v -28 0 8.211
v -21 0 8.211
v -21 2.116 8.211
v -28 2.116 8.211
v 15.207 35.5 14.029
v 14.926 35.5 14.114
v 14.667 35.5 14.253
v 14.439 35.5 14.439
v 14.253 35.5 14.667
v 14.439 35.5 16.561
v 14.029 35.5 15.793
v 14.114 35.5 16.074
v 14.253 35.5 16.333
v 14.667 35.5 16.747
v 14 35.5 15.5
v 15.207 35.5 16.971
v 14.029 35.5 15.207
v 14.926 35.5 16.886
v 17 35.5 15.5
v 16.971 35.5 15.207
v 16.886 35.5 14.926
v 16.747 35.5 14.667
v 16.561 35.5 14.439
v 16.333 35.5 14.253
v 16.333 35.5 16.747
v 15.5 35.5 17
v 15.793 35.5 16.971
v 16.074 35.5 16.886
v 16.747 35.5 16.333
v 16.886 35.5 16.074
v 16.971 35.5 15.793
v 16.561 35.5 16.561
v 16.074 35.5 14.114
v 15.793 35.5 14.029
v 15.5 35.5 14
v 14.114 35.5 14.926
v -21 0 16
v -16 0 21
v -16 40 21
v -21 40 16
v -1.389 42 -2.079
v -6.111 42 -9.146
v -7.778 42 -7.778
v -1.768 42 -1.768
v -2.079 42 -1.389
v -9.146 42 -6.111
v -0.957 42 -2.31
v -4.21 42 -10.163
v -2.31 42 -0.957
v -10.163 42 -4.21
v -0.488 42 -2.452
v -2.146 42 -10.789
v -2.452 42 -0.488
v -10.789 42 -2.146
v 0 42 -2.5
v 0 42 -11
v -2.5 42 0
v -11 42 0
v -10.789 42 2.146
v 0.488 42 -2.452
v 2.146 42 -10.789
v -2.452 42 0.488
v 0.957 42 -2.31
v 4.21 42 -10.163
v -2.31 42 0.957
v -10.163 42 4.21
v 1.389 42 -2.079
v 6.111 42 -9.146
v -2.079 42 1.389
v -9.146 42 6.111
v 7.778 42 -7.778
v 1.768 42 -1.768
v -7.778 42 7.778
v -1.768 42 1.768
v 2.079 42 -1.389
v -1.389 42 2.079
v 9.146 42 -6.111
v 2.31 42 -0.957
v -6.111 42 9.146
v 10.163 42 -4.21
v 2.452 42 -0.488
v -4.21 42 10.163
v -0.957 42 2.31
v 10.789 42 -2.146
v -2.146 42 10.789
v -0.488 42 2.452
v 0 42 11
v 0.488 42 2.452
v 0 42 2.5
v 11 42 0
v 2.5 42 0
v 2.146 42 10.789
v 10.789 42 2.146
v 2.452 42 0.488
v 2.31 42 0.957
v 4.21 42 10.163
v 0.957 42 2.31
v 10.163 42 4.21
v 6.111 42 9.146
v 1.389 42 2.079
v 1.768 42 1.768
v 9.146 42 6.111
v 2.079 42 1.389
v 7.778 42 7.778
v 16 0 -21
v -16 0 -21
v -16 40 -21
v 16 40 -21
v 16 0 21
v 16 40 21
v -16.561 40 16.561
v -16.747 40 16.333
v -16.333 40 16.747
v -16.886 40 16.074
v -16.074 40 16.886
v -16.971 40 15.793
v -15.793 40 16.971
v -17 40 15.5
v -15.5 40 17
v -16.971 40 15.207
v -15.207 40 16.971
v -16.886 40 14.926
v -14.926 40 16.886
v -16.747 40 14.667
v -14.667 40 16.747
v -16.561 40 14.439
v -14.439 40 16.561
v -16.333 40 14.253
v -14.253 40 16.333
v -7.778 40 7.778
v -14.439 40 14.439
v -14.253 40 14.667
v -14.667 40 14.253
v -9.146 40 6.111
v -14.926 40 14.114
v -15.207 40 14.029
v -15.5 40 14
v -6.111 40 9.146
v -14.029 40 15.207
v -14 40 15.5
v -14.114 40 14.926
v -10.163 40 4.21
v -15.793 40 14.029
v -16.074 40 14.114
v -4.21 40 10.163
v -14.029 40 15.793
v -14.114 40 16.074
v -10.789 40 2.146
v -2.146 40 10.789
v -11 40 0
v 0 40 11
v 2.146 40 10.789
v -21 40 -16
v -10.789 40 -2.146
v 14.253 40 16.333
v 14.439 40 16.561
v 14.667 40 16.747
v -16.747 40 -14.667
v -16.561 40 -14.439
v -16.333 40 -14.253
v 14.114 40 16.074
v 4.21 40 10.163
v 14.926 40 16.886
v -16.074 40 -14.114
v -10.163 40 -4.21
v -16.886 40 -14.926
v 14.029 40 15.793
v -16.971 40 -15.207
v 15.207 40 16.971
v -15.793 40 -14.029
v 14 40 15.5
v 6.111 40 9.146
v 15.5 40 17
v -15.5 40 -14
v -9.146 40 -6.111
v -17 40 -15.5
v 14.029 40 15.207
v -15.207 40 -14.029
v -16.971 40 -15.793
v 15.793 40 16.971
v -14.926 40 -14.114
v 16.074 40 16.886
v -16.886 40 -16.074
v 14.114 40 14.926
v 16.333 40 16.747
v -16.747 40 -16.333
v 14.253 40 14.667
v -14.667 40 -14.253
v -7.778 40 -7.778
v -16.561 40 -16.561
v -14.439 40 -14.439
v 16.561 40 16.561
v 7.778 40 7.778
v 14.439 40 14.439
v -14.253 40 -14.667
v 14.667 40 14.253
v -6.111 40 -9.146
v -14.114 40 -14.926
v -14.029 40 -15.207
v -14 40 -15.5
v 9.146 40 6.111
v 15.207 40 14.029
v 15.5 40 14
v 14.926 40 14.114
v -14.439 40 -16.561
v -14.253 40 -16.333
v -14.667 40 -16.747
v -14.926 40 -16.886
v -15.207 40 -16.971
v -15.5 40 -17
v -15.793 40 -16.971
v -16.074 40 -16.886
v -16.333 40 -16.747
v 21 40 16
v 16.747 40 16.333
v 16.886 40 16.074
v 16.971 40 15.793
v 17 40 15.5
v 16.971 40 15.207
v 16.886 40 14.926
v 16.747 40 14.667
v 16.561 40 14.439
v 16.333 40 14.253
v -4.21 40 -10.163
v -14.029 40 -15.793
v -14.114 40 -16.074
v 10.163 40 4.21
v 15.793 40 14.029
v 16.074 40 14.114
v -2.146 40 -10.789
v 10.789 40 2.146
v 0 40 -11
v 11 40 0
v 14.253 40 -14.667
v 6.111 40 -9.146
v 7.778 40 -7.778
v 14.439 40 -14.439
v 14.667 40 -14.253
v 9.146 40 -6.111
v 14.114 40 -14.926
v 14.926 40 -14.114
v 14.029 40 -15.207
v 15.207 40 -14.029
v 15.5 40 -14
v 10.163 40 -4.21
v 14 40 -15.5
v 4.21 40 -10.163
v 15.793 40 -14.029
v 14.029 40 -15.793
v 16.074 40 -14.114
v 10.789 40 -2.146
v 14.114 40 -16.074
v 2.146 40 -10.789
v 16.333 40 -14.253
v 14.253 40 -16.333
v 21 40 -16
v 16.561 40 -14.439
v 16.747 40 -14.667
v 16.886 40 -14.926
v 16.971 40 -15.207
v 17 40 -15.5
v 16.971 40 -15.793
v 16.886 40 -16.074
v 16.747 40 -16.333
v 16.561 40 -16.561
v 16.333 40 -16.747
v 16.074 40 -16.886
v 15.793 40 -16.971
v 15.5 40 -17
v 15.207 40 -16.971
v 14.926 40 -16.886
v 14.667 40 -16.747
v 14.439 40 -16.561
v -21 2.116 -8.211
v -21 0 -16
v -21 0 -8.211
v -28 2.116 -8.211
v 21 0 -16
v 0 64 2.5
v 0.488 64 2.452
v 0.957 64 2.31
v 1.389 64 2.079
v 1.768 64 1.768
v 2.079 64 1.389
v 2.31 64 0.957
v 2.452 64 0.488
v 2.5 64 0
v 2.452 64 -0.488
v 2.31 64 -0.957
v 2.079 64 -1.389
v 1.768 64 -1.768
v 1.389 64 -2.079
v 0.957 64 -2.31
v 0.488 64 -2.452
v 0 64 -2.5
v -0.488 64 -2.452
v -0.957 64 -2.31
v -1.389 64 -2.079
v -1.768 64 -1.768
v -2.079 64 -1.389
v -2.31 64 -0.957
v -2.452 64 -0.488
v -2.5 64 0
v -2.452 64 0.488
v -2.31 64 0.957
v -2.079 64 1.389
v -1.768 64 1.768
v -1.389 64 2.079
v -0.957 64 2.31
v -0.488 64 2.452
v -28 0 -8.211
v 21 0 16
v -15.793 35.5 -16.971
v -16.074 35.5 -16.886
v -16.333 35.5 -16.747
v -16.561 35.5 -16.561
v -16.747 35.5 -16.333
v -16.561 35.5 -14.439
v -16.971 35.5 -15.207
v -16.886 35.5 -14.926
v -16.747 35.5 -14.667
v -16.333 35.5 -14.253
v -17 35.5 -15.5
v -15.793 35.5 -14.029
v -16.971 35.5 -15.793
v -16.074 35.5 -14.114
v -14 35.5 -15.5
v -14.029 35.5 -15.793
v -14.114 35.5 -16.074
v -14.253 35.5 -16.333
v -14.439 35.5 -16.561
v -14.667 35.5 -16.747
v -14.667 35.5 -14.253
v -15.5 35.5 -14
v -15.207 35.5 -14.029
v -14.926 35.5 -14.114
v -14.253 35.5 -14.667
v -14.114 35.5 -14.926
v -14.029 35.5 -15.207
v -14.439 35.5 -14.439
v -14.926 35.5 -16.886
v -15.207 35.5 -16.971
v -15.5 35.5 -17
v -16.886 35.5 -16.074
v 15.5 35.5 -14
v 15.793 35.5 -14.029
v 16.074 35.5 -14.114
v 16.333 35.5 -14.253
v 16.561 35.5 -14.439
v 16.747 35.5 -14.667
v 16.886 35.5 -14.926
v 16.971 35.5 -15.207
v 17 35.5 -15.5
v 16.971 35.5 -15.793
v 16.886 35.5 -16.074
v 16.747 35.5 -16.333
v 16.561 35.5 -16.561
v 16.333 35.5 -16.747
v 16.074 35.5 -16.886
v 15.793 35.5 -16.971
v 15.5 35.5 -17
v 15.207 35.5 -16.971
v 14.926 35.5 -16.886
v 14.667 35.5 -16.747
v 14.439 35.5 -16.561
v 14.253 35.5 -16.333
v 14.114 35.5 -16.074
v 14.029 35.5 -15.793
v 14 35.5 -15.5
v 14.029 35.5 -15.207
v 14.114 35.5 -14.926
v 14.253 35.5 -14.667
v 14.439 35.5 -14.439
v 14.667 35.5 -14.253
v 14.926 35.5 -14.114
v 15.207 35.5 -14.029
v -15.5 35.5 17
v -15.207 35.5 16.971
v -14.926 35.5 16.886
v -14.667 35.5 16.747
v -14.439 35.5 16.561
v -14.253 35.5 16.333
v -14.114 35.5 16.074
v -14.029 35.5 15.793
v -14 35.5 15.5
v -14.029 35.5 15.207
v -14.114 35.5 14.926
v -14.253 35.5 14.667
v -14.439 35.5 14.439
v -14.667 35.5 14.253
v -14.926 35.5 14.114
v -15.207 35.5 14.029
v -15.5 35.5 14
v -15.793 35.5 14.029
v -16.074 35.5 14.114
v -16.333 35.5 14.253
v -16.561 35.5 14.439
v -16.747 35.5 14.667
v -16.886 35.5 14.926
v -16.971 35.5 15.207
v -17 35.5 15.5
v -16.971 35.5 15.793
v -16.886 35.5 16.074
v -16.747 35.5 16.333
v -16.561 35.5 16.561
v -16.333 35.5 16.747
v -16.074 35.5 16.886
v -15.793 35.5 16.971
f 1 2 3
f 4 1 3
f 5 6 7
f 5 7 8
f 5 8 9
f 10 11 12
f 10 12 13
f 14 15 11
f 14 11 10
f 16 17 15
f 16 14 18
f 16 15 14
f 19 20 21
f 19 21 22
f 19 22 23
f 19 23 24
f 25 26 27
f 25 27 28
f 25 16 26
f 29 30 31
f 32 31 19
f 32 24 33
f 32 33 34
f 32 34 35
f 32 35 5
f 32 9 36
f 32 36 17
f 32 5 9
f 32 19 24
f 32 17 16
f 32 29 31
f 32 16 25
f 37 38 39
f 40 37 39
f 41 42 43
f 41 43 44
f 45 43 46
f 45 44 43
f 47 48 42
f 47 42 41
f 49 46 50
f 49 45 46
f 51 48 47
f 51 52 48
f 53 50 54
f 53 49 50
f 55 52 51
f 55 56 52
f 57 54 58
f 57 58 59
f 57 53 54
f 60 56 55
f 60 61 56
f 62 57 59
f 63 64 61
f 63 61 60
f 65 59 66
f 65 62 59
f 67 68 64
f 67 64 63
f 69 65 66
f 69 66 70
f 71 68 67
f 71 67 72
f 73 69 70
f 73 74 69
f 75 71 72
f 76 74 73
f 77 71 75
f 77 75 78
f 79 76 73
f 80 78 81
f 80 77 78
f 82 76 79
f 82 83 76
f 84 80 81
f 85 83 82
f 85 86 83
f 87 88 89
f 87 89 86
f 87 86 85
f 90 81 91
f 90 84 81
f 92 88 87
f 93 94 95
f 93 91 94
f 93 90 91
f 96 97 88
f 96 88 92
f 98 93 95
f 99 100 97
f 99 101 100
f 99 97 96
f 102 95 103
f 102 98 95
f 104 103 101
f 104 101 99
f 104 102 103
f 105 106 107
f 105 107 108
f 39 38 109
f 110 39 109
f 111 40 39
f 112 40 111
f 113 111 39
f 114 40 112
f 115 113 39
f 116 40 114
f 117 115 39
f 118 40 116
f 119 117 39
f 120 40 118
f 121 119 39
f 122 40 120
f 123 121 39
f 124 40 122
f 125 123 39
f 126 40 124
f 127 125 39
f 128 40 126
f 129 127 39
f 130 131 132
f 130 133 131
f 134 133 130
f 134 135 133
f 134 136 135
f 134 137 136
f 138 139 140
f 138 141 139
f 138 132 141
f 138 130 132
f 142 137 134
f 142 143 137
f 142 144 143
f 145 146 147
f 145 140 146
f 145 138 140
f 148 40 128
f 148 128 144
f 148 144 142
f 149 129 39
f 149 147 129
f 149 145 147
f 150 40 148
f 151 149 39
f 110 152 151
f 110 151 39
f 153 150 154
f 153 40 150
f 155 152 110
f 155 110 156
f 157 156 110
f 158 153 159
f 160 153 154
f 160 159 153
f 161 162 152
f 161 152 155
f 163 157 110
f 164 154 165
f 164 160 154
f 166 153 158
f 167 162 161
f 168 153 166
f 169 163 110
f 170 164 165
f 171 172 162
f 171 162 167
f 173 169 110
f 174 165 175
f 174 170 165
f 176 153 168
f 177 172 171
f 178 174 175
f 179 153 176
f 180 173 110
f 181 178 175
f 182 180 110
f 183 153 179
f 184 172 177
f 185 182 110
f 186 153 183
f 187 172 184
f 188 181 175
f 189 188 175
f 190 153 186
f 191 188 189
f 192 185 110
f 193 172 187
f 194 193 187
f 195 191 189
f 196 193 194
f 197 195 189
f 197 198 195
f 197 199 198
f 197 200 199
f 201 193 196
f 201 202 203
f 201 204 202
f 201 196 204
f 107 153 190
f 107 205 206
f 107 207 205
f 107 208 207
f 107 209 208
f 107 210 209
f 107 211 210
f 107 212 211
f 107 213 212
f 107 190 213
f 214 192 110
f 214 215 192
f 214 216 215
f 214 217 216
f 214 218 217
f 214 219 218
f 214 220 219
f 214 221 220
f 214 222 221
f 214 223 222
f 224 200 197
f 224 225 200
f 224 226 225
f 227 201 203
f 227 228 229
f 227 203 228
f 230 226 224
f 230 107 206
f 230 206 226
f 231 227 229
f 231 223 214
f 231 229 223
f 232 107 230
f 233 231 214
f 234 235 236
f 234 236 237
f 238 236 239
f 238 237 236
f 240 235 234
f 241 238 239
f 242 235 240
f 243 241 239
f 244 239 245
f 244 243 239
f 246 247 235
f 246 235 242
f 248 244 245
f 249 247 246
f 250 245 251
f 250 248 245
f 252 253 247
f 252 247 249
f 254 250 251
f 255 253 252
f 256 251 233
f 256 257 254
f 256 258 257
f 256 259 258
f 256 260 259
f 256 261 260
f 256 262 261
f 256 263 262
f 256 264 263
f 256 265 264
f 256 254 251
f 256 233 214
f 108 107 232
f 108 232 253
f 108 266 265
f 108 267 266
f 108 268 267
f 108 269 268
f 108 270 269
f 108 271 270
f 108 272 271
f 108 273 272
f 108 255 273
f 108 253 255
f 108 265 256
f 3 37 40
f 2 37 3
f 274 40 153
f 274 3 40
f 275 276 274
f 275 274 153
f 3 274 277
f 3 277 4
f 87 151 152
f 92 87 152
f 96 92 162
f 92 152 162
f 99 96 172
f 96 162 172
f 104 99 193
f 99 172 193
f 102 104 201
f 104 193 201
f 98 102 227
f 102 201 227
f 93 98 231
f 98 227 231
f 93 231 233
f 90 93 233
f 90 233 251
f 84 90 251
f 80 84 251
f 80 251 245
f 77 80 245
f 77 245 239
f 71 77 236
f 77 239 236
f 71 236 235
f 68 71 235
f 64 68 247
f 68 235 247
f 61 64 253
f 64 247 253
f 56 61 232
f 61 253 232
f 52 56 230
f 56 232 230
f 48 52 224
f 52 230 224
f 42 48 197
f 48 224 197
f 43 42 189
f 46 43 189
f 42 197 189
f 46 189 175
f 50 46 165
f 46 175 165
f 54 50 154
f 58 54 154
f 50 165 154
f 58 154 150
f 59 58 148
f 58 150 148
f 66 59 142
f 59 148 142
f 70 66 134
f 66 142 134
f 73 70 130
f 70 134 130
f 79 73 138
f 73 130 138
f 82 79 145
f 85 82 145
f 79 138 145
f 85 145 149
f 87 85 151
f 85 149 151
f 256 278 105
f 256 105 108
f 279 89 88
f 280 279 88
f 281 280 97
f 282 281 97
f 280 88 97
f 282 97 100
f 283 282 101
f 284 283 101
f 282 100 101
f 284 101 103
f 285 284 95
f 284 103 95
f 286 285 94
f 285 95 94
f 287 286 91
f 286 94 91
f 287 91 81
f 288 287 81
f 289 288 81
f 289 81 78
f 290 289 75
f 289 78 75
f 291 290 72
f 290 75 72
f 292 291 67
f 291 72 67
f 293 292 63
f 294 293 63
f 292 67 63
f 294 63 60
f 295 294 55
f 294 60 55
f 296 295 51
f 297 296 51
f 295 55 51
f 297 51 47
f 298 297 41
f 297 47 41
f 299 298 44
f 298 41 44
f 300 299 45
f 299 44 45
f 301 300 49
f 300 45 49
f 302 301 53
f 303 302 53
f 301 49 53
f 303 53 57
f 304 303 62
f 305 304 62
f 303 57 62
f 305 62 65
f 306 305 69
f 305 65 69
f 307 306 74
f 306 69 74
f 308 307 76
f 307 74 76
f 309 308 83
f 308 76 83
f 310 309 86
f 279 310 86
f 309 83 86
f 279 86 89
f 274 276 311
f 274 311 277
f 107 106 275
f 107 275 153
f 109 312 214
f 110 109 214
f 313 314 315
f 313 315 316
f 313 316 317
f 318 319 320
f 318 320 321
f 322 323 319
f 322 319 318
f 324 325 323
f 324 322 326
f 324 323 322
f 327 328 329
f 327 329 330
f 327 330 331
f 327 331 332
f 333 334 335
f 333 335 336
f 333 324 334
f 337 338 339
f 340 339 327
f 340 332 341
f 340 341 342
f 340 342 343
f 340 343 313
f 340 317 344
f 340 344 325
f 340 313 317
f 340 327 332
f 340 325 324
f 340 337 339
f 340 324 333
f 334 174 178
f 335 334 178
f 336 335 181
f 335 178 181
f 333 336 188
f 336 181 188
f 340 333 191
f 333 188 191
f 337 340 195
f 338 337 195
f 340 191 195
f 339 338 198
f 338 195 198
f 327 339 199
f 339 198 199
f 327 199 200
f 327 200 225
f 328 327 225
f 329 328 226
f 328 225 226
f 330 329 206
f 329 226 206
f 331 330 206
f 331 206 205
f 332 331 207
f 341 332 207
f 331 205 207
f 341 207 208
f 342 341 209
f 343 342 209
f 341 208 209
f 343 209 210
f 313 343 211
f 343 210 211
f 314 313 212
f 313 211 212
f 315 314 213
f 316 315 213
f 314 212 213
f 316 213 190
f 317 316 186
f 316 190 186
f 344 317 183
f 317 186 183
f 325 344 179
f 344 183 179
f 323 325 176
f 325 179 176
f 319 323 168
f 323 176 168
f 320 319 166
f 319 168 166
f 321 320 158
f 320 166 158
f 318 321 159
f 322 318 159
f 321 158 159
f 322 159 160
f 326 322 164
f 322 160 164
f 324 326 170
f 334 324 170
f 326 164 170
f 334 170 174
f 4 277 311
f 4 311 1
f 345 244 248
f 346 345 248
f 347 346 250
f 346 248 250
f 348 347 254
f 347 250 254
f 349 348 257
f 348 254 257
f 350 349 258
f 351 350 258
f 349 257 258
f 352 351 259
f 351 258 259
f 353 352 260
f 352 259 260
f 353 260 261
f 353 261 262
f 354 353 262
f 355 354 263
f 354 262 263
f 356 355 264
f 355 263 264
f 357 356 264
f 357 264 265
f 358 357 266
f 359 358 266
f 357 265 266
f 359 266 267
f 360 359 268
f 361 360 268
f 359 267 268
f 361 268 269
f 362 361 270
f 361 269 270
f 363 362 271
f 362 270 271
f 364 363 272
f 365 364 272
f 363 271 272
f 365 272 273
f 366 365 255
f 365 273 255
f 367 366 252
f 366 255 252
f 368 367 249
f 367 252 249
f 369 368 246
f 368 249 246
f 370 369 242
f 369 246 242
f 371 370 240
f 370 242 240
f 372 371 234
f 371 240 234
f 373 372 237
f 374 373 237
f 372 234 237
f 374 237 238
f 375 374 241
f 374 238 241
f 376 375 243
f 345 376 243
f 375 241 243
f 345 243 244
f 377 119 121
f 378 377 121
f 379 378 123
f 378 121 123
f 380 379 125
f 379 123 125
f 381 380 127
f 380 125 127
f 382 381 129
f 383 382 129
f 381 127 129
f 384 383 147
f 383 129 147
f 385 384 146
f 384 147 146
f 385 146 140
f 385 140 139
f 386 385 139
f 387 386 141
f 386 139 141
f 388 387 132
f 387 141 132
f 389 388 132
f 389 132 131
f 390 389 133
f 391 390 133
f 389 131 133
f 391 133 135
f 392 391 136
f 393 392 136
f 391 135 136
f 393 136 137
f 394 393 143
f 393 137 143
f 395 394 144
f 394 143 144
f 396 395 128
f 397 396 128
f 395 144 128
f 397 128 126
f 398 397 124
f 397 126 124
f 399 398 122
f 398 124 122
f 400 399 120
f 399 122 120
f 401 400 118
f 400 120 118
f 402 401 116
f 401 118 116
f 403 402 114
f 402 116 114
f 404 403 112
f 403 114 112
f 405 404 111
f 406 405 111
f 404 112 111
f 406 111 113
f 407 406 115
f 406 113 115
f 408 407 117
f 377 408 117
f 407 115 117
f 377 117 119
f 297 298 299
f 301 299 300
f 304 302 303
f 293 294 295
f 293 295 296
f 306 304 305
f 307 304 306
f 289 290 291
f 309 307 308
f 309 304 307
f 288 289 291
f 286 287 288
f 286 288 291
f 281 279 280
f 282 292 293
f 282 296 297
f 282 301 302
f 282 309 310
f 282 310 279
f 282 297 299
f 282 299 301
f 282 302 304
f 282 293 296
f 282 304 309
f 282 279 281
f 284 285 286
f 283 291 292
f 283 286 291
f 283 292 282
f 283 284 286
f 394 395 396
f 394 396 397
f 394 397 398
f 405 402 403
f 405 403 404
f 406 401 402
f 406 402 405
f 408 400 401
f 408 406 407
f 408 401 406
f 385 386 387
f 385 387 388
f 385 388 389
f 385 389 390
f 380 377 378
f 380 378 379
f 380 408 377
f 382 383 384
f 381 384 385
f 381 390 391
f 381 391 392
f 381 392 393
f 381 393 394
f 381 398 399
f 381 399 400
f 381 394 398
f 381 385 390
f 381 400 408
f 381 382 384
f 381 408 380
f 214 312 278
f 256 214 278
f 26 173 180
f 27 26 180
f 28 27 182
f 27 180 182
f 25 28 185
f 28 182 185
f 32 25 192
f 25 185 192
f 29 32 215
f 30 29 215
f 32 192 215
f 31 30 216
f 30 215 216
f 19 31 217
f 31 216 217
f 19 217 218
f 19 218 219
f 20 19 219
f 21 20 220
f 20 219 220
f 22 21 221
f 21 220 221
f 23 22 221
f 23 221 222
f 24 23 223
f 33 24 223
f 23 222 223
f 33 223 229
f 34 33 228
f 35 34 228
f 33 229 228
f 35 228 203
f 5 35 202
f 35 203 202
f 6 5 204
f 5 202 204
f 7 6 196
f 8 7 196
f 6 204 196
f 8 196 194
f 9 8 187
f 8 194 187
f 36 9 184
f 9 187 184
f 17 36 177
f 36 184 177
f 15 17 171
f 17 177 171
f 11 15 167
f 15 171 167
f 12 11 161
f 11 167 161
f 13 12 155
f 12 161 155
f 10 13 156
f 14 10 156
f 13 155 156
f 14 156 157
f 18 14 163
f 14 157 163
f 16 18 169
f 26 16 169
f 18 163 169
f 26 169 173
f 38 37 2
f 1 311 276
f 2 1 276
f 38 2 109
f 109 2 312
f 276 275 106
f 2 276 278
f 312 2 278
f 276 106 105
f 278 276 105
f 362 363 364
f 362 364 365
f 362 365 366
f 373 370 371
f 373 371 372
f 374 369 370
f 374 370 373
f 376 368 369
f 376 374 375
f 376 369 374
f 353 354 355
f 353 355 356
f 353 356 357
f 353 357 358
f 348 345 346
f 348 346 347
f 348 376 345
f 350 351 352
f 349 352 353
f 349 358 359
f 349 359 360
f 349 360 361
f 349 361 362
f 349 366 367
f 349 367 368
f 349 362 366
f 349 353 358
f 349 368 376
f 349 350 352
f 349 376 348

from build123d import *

# Parameters (mm, degrees)
SKETCH_1_W          = 42
SKETCH_1_H          = 42
EXTRUDE_1_DEPTH     = 40
SKETCH_2_R          = 11
EXTRUDE_2_DEPTH     = 2
SKETCH_3_R          = 2.5
EXTRUDE_3_DEPTH     = 22
SKETCH_4_R          = 1.5
CUT_EXTRUDE_1_DEPTH = 4.5
CHAMFER_1_SIZE      = 5
SKETCH_5_W          = 16.42199876
SKETCH_5_H          = 2.116075979
EXTRUDE_4_DEPTH     = 7


with BuildPart() as part:
    # 草图1 → 凸台-拉伸1 (new body)
    with BuildSketch(Plane(origin=(0, 0, 0), x_dir=(1, 0, 0), z_dir=(0, 1, 0))):
        Rectangle(SKETCH_1_W, SKETCH_1_H)
    extrude(amount=EXTRUDE_1_DEPTH)

    # 草图2 → 凸台-拉伸2 (add)
    with BuildSketch(Plane(origin=(0, 40, 0), x_dir=(1, 0, 0), z_dir=(0, 1, 0))):
        with Locations(Location((0, 0, 0), (0, 0, 270))):
            Circle(SKETCH_2_R)
    extrude(amount=EXTRUDE_2_DEPTH)

    # 草图3 → 凸台-拉伸3 (add)
    with BuildSketch(Plane(origin=(0, 42, 0), x_dir=(1, 0, 0), z_dir=(0, 1, 0))):
        with Locations(Location((0, 0, 0), (0, 0, 270))):
            Circle(SKETCH_3_R)
    extrude(amount=EXTRUDE_3_DEPTH)

    # 草图4 → 切除-拉伸1 (cut)
    with BuildSketch(Plane(origin=(0, 40, 0), x_dir=(1, 0, 0), z_dir=(0, 1, 0))):
        with Locations(Location((-15.5, 15.5, 0), (0, 0, 270))):
            Circle(SKETCH_4_R)
        with Locations(Location((15.5, 15.5, 0), (0, 0, 270))):
            Circle(SKETCH_4_R)
        with Locations(Location((15.5, -15.5, 0), (0, 0, 270))):
            Circle(SKETCH_4_R)
        with Locations(Location((-15.5, -15.5, 0), (0, 0, 270))):
            Circle(SKETCH_4_R)
    extrude(amount=-CUT_EXTRUDE_1_DEPTH, mode=Mode.SUBTRACT)

    # 倒角1
    chamfer_1_edges = [part.edges().sort_by_distance(p)[0] for p in [
        (21, 20, 21),
        (-21, 20, 21),
        (-21, 20, -21),
        (21, 20, -21),
    ]]
    chamfer(chamfer_1_edges, length=CHAMFER_1_SIZE)

    # 草图5 → 凸台-拉伸4 (add)
    with BuildSketch(Plane.ZY.offset(21)):
        with Locations((0, 1.05803799)):
            Rectangle(SKETCH_5_W, SKETCH_5_H)
    extrude(amount=EXTRUDE_4_DEPTH)


solid = part.part
